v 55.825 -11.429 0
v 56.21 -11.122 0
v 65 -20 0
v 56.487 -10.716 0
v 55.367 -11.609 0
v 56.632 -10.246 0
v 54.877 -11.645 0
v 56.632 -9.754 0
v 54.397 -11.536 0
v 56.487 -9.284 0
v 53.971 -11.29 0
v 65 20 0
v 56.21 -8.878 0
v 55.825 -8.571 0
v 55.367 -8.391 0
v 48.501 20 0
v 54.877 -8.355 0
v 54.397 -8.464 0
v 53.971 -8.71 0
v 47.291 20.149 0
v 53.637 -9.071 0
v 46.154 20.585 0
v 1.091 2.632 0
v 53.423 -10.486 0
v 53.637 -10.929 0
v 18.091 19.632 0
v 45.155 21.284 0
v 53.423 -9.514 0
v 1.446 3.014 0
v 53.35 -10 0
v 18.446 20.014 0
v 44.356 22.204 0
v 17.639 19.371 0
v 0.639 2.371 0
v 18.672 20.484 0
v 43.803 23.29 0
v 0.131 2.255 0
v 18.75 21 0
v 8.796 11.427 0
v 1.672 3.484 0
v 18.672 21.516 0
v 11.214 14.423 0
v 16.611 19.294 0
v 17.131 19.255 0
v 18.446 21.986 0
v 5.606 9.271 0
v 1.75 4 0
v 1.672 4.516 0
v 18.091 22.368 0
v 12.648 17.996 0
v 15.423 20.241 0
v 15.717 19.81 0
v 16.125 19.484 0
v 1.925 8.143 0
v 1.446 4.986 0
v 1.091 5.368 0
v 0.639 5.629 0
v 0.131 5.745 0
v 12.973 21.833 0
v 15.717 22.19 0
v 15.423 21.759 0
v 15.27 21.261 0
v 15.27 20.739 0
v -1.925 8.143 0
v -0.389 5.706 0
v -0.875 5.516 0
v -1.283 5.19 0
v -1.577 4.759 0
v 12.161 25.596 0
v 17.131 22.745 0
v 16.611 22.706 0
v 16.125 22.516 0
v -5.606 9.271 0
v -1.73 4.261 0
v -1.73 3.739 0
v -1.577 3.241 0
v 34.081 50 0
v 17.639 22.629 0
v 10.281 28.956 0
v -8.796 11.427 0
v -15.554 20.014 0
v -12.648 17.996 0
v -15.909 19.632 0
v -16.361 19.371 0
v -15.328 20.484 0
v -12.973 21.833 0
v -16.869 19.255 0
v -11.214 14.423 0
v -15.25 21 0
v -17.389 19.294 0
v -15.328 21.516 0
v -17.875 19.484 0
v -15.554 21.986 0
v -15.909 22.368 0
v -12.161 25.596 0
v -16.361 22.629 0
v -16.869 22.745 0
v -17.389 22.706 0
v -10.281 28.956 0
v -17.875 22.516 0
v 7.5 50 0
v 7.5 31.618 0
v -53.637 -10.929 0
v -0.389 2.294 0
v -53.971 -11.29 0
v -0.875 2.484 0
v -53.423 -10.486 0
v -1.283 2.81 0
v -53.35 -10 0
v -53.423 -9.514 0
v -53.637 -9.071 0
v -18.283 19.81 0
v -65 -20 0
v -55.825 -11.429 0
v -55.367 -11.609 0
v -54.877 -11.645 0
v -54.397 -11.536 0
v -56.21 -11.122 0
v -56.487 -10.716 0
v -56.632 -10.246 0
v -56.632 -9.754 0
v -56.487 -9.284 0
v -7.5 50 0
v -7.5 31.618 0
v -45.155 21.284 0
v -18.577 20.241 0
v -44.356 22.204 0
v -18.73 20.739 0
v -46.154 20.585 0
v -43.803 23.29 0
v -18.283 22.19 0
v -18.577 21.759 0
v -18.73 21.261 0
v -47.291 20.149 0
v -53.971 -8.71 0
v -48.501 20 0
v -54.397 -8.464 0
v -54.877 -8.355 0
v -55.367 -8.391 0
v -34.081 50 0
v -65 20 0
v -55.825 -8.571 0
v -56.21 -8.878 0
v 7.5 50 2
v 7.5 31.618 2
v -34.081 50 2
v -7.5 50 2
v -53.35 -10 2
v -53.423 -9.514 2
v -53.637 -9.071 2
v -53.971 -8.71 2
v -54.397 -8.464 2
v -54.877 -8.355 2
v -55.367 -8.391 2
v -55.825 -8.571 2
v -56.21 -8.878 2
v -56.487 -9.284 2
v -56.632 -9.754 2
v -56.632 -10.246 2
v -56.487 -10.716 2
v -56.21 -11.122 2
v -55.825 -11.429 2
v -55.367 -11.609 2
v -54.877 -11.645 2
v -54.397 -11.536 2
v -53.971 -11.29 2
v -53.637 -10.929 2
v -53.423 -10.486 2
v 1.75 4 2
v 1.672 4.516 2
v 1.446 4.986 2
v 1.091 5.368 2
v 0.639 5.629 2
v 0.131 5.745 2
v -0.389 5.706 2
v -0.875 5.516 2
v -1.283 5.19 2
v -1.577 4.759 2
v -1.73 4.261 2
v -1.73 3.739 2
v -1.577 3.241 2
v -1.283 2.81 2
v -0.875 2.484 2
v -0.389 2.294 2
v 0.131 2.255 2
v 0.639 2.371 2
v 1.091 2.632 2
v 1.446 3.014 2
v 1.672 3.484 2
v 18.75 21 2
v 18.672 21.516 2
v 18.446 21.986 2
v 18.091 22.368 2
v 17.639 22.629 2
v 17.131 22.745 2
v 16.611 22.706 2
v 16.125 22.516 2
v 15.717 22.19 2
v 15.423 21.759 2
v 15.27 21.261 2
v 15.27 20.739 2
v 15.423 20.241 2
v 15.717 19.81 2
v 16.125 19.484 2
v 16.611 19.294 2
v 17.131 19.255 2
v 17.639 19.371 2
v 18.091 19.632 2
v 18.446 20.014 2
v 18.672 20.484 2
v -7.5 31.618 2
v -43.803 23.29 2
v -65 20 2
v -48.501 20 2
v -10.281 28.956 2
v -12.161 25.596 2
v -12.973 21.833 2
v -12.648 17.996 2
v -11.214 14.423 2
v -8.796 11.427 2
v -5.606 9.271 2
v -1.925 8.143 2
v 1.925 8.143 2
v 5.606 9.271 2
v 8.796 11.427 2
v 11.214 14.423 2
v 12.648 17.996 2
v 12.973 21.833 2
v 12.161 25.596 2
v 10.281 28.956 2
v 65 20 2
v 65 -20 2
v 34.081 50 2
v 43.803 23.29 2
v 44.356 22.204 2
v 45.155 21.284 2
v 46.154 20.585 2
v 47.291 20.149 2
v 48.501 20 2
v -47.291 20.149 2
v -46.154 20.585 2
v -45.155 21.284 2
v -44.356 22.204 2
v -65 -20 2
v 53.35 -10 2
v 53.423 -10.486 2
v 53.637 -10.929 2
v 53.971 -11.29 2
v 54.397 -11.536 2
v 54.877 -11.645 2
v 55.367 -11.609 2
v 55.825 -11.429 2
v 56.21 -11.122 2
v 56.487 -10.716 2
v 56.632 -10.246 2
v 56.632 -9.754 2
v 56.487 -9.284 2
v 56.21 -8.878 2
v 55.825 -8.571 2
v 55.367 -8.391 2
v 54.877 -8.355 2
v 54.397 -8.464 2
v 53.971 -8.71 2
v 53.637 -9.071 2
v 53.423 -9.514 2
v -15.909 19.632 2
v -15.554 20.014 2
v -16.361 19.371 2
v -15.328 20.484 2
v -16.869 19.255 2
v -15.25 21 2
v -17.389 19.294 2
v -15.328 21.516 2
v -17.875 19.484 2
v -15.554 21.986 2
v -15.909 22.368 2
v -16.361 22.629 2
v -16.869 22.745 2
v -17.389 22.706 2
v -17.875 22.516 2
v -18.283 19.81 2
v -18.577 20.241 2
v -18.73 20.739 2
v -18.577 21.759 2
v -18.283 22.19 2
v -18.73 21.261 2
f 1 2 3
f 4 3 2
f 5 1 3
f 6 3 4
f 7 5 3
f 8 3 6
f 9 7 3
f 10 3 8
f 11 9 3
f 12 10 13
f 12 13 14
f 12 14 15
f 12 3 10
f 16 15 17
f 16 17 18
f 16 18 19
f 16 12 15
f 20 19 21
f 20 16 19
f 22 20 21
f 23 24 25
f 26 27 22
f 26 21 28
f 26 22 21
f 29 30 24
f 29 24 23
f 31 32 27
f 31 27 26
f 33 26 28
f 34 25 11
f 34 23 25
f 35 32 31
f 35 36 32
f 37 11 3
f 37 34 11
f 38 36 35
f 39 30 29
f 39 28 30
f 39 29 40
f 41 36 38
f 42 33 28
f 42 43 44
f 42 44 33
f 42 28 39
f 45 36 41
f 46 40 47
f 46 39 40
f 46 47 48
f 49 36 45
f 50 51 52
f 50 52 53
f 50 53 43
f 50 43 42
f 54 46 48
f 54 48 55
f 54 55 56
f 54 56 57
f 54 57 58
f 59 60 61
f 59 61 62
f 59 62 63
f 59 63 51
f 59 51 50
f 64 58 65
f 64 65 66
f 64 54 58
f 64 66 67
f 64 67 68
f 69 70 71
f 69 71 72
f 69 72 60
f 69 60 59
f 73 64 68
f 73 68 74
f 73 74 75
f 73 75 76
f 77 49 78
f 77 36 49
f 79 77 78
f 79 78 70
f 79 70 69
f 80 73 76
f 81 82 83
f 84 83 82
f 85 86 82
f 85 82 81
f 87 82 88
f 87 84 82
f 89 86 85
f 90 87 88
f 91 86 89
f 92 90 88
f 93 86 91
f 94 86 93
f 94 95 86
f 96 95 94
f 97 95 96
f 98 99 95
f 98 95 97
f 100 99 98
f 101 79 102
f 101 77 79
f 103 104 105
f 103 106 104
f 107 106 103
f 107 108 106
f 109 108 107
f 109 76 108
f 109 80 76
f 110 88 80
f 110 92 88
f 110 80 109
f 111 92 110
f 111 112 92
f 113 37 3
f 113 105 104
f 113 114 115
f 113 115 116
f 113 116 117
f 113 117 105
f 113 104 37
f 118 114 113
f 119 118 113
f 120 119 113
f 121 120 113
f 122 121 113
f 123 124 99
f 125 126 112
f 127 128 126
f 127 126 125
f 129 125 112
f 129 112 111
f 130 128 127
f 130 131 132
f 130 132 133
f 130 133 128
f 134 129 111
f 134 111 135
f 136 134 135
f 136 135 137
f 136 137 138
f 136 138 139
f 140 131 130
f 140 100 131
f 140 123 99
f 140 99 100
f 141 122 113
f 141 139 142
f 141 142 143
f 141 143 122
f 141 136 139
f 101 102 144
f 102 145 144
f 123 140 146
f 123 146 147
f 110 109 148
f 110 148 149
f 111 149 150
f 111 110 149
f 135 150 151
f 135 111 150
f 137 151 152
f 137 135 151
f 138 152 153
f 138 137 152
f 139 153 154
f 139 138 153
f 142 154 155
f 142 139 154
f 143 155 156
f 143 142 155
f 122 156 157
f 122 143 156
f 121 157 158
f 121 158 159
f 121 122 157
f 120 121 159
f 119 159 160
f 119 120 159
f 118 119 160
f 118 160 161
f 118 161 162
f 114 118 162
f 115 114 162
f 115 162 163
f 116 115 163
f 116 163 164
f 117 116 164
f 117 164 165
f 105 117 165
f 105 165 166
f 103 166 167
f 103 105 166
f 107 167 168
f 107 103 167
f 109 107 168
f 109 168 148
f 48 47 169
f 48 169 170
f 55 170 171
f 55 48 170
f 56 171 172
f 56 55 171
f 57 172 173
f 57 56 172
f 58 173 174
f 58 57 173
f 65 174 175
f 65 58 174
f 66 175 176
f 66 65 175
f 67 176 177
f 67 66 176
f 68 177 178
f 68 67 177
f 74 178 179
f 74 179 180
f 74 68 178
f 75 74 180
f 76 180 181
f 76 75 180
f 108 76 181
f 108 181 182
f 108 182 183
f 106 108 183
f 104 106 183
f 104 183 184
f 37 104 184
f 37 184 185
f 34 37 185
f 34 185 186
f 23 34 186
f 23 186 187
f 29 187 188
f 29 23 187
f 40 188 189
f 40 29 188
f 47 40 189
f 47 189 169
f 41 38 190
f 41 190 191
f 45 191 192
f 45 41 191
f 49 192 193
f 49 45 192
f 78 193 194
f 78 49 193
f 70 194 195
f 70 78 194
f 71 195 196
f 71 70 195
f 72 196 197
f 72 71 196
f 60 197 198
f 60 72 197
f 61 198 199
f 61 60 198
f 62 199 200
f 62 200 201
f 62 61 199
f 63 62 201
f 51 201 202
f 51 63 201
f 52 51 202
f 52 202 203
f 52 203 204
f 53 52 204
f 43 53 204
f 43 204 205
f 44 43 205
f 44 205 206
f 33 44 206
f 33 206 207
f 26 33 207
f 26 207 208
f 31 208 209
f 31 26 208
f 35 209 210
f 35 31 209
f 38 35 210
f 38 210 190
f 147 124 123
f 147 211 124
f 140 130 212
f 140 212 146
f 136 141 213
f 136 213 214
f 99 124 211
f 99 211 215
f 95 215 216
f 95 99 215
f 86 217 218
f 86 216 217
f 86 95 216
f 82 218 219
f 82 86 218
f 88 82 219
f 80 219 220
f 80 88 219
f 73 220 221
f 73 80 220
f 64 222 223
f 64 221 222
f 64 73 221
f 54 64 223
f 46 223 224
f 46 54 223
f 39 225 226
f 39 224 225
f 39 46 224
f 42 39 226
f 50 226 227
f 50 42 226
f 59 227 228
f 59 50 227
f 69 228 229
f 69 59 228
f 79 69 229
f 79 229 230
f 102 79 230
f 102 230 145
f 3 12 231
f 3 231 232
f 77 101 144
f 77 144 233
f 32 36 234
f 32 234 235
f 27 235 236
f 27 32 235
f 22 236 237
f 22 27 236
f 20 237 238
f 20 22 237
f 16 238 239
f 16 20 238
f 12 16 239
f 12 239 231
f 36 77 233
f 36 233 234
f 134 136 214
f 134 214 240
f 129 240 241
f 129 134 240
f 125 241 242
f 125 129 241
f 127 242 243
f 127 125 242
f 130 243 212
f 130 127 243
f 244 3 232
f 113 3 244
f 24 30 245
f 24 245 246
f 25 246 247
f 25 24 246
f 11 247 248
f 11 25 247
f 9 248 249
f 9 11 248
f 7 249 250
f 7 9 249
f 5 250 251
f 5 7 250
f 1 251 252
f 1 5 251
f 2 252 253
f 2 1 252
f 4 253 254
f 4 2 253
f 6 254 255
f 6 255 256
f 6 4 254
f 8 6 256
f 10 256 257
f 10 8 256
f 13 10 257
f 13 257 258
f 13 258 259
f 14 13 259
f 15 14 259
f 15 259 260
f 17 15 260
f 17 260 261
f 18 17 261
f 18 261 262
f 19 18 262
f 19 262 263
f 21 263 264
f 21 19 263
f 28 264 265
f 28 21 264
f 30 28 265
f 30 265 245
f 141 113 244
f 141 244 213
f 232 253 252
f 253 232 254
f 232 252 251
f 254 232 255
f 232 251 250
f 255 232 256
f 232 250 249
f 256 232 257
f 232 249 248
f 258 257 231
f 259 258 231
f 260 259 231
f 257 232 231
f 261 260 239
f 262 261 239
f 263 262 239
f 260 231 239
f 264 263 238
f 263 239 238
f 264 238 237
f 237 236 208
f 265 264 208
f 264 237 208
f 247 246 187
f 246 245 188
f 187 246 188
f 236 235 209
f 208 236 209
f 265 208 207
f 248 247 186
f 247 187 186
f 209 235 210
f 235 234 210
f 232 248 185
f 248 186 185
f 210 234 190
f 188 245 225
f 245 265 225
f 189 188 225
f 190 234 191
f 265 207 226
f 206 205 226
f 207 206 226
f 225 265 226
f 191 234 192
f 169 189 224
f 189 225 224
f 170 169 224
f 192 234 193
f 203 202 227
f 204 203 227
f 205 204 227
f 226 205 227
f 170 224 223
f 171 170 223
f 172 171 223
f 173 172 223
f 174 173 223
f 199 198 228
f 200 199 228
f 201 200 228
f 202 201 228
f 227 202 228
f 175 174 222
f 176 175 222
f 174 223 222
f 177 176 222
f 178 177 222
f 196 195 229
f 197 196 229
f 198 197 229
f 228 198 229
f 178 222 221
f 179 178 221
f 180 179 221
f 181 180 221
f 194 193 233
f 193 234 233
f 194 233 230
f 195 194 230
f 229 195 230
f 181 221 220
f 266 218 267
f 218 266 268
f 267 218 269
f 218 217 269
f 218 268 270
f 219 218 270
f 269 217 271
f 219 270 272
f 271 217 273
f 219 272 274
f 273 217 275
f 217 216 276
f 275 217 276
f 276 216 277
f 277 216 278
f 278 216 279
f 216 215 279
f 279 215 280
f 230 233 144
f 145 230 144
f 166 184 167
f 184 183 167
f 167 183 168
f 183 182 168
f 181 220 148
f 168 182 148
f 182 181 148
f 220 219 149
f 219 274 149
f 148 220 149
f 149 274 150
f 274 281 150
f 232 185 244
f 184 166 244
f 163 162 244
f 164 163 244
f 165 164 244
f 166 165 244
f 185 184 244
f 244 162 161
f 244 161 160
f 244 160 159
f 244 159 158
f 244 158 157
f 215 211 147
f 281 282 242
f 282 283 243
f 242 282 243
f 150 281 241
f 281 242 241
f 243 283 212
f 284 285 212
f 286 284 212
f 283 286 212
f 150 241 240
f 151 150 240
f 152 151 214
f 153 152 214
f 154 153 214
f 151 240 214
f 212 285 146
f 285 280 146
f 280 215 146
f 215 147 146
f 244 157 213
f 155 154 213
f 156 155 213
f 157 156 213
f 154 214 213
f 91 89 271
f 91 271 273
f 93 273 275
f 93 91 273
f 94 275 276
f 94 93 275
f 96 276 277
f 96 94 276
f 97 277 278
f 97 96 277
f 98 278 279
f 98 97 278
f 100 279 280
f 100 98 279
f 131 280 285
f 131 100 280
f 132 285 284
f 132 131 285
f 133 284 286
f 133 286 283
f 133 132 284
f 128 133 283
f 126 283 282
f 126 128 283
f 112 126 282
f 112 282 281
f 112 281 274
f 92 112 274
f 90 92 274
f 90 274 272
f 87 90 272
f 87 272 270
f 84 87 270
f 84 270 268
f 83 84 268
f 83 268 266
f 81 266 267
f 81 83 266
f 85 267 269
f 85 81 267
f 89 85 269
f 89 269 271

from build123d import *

# Parameters (mm, degrees)
EXTRUDE_1_DEPTH     = 2
SKETCH_2_R          = 1.65
CUT_EXTRUDE_1_DEPTH = 2
SKETCH_3_R          = 1.75
SKETCH_3_R_2        = 13
CUT_EXTRUDE_2_DEPTH = 2
SKETCH_4_W          = 15
SKETCH_4_H          = 22.74802609
CUT_EXTRUDE_3_DEPTH = 5


with BuildPart() as part:
    # 草图1 → 凸台-拉伸1 (new body)
    with BuildSketch(Plane.XY):
        with BuildLine():
            Line((-43.802574587, 23.289899283), (-34.080892972, 50))
            Line((-34.080892972, 50), (34.080892972, 50))
            Line((34.080892972, 50), (43.802574587, 23.289899283))
            ThreePointArc((43.802574587, 23.289899283), (45.633155509, 20.904239779), (48.501037691, 20))
            Line((48.501037691, 20), (65, 20))
            Line((65, 20), (65, -20))
            Line((65, -20), (-65, -20))
            Line((-65, -20), (-65, 20))
            Line((-65, 20), (-48.501037691, 20))
            ThreePointArc((-48.501037691, 20), (-45.633155509, 20.904239779), (-43.802574587, 23.289899283))
        make_face()
    extrude(amount=EXTRUDE_1_DEPTH)

    # 草图2 → 切除-拉伸1 (cut)
    with BuildSketch(Plane.XY):
        with Locations((-55, -10)):
            Circle(SKETCH_2_R)
        with Locations(Location((55, -10, 0), (0, 0, 180))):
            Circle(SKETCH_2_R)
    extrude(amount=CUT_EXTRUDE_1_DEPTH, mode=Mode.SUBTRACT)

    # 草图3 → 切除-拉伸2 (cut)
    with BuildSketch(Plane.XY):
        with Locations((0, 38)):
            Circle(SKETCH_3_R)
        with Locations((17, 21)):
            Circle(SKETCH_3_R)
        with Locations((0, 4)):
            Circle(SKETCH_3_R)
        with Locations((-17, 21)):
            Circle(SKETCH_3_R)
        with Locations((0, 21)):
            Circle(SKETCH_3_R_2)
    extrude(amount=CUT_EXTRUDE_2_DEPTH, mode=Mode.SUBTRACT)

    # 草图4 → 切除-拉伸3 (cut, symmetric)
    with BuildSketch(Plane.XY.offset(2)):
        with Locations((0, 38.625986955)):
            Rectangle(SKETCH_4_W, SKETCH_4_H)
    extrude(amount=CUT_EXTRUDE_3_DEPTH, both=True, mode=Mode.SUBTRACT)


solid = part.part
